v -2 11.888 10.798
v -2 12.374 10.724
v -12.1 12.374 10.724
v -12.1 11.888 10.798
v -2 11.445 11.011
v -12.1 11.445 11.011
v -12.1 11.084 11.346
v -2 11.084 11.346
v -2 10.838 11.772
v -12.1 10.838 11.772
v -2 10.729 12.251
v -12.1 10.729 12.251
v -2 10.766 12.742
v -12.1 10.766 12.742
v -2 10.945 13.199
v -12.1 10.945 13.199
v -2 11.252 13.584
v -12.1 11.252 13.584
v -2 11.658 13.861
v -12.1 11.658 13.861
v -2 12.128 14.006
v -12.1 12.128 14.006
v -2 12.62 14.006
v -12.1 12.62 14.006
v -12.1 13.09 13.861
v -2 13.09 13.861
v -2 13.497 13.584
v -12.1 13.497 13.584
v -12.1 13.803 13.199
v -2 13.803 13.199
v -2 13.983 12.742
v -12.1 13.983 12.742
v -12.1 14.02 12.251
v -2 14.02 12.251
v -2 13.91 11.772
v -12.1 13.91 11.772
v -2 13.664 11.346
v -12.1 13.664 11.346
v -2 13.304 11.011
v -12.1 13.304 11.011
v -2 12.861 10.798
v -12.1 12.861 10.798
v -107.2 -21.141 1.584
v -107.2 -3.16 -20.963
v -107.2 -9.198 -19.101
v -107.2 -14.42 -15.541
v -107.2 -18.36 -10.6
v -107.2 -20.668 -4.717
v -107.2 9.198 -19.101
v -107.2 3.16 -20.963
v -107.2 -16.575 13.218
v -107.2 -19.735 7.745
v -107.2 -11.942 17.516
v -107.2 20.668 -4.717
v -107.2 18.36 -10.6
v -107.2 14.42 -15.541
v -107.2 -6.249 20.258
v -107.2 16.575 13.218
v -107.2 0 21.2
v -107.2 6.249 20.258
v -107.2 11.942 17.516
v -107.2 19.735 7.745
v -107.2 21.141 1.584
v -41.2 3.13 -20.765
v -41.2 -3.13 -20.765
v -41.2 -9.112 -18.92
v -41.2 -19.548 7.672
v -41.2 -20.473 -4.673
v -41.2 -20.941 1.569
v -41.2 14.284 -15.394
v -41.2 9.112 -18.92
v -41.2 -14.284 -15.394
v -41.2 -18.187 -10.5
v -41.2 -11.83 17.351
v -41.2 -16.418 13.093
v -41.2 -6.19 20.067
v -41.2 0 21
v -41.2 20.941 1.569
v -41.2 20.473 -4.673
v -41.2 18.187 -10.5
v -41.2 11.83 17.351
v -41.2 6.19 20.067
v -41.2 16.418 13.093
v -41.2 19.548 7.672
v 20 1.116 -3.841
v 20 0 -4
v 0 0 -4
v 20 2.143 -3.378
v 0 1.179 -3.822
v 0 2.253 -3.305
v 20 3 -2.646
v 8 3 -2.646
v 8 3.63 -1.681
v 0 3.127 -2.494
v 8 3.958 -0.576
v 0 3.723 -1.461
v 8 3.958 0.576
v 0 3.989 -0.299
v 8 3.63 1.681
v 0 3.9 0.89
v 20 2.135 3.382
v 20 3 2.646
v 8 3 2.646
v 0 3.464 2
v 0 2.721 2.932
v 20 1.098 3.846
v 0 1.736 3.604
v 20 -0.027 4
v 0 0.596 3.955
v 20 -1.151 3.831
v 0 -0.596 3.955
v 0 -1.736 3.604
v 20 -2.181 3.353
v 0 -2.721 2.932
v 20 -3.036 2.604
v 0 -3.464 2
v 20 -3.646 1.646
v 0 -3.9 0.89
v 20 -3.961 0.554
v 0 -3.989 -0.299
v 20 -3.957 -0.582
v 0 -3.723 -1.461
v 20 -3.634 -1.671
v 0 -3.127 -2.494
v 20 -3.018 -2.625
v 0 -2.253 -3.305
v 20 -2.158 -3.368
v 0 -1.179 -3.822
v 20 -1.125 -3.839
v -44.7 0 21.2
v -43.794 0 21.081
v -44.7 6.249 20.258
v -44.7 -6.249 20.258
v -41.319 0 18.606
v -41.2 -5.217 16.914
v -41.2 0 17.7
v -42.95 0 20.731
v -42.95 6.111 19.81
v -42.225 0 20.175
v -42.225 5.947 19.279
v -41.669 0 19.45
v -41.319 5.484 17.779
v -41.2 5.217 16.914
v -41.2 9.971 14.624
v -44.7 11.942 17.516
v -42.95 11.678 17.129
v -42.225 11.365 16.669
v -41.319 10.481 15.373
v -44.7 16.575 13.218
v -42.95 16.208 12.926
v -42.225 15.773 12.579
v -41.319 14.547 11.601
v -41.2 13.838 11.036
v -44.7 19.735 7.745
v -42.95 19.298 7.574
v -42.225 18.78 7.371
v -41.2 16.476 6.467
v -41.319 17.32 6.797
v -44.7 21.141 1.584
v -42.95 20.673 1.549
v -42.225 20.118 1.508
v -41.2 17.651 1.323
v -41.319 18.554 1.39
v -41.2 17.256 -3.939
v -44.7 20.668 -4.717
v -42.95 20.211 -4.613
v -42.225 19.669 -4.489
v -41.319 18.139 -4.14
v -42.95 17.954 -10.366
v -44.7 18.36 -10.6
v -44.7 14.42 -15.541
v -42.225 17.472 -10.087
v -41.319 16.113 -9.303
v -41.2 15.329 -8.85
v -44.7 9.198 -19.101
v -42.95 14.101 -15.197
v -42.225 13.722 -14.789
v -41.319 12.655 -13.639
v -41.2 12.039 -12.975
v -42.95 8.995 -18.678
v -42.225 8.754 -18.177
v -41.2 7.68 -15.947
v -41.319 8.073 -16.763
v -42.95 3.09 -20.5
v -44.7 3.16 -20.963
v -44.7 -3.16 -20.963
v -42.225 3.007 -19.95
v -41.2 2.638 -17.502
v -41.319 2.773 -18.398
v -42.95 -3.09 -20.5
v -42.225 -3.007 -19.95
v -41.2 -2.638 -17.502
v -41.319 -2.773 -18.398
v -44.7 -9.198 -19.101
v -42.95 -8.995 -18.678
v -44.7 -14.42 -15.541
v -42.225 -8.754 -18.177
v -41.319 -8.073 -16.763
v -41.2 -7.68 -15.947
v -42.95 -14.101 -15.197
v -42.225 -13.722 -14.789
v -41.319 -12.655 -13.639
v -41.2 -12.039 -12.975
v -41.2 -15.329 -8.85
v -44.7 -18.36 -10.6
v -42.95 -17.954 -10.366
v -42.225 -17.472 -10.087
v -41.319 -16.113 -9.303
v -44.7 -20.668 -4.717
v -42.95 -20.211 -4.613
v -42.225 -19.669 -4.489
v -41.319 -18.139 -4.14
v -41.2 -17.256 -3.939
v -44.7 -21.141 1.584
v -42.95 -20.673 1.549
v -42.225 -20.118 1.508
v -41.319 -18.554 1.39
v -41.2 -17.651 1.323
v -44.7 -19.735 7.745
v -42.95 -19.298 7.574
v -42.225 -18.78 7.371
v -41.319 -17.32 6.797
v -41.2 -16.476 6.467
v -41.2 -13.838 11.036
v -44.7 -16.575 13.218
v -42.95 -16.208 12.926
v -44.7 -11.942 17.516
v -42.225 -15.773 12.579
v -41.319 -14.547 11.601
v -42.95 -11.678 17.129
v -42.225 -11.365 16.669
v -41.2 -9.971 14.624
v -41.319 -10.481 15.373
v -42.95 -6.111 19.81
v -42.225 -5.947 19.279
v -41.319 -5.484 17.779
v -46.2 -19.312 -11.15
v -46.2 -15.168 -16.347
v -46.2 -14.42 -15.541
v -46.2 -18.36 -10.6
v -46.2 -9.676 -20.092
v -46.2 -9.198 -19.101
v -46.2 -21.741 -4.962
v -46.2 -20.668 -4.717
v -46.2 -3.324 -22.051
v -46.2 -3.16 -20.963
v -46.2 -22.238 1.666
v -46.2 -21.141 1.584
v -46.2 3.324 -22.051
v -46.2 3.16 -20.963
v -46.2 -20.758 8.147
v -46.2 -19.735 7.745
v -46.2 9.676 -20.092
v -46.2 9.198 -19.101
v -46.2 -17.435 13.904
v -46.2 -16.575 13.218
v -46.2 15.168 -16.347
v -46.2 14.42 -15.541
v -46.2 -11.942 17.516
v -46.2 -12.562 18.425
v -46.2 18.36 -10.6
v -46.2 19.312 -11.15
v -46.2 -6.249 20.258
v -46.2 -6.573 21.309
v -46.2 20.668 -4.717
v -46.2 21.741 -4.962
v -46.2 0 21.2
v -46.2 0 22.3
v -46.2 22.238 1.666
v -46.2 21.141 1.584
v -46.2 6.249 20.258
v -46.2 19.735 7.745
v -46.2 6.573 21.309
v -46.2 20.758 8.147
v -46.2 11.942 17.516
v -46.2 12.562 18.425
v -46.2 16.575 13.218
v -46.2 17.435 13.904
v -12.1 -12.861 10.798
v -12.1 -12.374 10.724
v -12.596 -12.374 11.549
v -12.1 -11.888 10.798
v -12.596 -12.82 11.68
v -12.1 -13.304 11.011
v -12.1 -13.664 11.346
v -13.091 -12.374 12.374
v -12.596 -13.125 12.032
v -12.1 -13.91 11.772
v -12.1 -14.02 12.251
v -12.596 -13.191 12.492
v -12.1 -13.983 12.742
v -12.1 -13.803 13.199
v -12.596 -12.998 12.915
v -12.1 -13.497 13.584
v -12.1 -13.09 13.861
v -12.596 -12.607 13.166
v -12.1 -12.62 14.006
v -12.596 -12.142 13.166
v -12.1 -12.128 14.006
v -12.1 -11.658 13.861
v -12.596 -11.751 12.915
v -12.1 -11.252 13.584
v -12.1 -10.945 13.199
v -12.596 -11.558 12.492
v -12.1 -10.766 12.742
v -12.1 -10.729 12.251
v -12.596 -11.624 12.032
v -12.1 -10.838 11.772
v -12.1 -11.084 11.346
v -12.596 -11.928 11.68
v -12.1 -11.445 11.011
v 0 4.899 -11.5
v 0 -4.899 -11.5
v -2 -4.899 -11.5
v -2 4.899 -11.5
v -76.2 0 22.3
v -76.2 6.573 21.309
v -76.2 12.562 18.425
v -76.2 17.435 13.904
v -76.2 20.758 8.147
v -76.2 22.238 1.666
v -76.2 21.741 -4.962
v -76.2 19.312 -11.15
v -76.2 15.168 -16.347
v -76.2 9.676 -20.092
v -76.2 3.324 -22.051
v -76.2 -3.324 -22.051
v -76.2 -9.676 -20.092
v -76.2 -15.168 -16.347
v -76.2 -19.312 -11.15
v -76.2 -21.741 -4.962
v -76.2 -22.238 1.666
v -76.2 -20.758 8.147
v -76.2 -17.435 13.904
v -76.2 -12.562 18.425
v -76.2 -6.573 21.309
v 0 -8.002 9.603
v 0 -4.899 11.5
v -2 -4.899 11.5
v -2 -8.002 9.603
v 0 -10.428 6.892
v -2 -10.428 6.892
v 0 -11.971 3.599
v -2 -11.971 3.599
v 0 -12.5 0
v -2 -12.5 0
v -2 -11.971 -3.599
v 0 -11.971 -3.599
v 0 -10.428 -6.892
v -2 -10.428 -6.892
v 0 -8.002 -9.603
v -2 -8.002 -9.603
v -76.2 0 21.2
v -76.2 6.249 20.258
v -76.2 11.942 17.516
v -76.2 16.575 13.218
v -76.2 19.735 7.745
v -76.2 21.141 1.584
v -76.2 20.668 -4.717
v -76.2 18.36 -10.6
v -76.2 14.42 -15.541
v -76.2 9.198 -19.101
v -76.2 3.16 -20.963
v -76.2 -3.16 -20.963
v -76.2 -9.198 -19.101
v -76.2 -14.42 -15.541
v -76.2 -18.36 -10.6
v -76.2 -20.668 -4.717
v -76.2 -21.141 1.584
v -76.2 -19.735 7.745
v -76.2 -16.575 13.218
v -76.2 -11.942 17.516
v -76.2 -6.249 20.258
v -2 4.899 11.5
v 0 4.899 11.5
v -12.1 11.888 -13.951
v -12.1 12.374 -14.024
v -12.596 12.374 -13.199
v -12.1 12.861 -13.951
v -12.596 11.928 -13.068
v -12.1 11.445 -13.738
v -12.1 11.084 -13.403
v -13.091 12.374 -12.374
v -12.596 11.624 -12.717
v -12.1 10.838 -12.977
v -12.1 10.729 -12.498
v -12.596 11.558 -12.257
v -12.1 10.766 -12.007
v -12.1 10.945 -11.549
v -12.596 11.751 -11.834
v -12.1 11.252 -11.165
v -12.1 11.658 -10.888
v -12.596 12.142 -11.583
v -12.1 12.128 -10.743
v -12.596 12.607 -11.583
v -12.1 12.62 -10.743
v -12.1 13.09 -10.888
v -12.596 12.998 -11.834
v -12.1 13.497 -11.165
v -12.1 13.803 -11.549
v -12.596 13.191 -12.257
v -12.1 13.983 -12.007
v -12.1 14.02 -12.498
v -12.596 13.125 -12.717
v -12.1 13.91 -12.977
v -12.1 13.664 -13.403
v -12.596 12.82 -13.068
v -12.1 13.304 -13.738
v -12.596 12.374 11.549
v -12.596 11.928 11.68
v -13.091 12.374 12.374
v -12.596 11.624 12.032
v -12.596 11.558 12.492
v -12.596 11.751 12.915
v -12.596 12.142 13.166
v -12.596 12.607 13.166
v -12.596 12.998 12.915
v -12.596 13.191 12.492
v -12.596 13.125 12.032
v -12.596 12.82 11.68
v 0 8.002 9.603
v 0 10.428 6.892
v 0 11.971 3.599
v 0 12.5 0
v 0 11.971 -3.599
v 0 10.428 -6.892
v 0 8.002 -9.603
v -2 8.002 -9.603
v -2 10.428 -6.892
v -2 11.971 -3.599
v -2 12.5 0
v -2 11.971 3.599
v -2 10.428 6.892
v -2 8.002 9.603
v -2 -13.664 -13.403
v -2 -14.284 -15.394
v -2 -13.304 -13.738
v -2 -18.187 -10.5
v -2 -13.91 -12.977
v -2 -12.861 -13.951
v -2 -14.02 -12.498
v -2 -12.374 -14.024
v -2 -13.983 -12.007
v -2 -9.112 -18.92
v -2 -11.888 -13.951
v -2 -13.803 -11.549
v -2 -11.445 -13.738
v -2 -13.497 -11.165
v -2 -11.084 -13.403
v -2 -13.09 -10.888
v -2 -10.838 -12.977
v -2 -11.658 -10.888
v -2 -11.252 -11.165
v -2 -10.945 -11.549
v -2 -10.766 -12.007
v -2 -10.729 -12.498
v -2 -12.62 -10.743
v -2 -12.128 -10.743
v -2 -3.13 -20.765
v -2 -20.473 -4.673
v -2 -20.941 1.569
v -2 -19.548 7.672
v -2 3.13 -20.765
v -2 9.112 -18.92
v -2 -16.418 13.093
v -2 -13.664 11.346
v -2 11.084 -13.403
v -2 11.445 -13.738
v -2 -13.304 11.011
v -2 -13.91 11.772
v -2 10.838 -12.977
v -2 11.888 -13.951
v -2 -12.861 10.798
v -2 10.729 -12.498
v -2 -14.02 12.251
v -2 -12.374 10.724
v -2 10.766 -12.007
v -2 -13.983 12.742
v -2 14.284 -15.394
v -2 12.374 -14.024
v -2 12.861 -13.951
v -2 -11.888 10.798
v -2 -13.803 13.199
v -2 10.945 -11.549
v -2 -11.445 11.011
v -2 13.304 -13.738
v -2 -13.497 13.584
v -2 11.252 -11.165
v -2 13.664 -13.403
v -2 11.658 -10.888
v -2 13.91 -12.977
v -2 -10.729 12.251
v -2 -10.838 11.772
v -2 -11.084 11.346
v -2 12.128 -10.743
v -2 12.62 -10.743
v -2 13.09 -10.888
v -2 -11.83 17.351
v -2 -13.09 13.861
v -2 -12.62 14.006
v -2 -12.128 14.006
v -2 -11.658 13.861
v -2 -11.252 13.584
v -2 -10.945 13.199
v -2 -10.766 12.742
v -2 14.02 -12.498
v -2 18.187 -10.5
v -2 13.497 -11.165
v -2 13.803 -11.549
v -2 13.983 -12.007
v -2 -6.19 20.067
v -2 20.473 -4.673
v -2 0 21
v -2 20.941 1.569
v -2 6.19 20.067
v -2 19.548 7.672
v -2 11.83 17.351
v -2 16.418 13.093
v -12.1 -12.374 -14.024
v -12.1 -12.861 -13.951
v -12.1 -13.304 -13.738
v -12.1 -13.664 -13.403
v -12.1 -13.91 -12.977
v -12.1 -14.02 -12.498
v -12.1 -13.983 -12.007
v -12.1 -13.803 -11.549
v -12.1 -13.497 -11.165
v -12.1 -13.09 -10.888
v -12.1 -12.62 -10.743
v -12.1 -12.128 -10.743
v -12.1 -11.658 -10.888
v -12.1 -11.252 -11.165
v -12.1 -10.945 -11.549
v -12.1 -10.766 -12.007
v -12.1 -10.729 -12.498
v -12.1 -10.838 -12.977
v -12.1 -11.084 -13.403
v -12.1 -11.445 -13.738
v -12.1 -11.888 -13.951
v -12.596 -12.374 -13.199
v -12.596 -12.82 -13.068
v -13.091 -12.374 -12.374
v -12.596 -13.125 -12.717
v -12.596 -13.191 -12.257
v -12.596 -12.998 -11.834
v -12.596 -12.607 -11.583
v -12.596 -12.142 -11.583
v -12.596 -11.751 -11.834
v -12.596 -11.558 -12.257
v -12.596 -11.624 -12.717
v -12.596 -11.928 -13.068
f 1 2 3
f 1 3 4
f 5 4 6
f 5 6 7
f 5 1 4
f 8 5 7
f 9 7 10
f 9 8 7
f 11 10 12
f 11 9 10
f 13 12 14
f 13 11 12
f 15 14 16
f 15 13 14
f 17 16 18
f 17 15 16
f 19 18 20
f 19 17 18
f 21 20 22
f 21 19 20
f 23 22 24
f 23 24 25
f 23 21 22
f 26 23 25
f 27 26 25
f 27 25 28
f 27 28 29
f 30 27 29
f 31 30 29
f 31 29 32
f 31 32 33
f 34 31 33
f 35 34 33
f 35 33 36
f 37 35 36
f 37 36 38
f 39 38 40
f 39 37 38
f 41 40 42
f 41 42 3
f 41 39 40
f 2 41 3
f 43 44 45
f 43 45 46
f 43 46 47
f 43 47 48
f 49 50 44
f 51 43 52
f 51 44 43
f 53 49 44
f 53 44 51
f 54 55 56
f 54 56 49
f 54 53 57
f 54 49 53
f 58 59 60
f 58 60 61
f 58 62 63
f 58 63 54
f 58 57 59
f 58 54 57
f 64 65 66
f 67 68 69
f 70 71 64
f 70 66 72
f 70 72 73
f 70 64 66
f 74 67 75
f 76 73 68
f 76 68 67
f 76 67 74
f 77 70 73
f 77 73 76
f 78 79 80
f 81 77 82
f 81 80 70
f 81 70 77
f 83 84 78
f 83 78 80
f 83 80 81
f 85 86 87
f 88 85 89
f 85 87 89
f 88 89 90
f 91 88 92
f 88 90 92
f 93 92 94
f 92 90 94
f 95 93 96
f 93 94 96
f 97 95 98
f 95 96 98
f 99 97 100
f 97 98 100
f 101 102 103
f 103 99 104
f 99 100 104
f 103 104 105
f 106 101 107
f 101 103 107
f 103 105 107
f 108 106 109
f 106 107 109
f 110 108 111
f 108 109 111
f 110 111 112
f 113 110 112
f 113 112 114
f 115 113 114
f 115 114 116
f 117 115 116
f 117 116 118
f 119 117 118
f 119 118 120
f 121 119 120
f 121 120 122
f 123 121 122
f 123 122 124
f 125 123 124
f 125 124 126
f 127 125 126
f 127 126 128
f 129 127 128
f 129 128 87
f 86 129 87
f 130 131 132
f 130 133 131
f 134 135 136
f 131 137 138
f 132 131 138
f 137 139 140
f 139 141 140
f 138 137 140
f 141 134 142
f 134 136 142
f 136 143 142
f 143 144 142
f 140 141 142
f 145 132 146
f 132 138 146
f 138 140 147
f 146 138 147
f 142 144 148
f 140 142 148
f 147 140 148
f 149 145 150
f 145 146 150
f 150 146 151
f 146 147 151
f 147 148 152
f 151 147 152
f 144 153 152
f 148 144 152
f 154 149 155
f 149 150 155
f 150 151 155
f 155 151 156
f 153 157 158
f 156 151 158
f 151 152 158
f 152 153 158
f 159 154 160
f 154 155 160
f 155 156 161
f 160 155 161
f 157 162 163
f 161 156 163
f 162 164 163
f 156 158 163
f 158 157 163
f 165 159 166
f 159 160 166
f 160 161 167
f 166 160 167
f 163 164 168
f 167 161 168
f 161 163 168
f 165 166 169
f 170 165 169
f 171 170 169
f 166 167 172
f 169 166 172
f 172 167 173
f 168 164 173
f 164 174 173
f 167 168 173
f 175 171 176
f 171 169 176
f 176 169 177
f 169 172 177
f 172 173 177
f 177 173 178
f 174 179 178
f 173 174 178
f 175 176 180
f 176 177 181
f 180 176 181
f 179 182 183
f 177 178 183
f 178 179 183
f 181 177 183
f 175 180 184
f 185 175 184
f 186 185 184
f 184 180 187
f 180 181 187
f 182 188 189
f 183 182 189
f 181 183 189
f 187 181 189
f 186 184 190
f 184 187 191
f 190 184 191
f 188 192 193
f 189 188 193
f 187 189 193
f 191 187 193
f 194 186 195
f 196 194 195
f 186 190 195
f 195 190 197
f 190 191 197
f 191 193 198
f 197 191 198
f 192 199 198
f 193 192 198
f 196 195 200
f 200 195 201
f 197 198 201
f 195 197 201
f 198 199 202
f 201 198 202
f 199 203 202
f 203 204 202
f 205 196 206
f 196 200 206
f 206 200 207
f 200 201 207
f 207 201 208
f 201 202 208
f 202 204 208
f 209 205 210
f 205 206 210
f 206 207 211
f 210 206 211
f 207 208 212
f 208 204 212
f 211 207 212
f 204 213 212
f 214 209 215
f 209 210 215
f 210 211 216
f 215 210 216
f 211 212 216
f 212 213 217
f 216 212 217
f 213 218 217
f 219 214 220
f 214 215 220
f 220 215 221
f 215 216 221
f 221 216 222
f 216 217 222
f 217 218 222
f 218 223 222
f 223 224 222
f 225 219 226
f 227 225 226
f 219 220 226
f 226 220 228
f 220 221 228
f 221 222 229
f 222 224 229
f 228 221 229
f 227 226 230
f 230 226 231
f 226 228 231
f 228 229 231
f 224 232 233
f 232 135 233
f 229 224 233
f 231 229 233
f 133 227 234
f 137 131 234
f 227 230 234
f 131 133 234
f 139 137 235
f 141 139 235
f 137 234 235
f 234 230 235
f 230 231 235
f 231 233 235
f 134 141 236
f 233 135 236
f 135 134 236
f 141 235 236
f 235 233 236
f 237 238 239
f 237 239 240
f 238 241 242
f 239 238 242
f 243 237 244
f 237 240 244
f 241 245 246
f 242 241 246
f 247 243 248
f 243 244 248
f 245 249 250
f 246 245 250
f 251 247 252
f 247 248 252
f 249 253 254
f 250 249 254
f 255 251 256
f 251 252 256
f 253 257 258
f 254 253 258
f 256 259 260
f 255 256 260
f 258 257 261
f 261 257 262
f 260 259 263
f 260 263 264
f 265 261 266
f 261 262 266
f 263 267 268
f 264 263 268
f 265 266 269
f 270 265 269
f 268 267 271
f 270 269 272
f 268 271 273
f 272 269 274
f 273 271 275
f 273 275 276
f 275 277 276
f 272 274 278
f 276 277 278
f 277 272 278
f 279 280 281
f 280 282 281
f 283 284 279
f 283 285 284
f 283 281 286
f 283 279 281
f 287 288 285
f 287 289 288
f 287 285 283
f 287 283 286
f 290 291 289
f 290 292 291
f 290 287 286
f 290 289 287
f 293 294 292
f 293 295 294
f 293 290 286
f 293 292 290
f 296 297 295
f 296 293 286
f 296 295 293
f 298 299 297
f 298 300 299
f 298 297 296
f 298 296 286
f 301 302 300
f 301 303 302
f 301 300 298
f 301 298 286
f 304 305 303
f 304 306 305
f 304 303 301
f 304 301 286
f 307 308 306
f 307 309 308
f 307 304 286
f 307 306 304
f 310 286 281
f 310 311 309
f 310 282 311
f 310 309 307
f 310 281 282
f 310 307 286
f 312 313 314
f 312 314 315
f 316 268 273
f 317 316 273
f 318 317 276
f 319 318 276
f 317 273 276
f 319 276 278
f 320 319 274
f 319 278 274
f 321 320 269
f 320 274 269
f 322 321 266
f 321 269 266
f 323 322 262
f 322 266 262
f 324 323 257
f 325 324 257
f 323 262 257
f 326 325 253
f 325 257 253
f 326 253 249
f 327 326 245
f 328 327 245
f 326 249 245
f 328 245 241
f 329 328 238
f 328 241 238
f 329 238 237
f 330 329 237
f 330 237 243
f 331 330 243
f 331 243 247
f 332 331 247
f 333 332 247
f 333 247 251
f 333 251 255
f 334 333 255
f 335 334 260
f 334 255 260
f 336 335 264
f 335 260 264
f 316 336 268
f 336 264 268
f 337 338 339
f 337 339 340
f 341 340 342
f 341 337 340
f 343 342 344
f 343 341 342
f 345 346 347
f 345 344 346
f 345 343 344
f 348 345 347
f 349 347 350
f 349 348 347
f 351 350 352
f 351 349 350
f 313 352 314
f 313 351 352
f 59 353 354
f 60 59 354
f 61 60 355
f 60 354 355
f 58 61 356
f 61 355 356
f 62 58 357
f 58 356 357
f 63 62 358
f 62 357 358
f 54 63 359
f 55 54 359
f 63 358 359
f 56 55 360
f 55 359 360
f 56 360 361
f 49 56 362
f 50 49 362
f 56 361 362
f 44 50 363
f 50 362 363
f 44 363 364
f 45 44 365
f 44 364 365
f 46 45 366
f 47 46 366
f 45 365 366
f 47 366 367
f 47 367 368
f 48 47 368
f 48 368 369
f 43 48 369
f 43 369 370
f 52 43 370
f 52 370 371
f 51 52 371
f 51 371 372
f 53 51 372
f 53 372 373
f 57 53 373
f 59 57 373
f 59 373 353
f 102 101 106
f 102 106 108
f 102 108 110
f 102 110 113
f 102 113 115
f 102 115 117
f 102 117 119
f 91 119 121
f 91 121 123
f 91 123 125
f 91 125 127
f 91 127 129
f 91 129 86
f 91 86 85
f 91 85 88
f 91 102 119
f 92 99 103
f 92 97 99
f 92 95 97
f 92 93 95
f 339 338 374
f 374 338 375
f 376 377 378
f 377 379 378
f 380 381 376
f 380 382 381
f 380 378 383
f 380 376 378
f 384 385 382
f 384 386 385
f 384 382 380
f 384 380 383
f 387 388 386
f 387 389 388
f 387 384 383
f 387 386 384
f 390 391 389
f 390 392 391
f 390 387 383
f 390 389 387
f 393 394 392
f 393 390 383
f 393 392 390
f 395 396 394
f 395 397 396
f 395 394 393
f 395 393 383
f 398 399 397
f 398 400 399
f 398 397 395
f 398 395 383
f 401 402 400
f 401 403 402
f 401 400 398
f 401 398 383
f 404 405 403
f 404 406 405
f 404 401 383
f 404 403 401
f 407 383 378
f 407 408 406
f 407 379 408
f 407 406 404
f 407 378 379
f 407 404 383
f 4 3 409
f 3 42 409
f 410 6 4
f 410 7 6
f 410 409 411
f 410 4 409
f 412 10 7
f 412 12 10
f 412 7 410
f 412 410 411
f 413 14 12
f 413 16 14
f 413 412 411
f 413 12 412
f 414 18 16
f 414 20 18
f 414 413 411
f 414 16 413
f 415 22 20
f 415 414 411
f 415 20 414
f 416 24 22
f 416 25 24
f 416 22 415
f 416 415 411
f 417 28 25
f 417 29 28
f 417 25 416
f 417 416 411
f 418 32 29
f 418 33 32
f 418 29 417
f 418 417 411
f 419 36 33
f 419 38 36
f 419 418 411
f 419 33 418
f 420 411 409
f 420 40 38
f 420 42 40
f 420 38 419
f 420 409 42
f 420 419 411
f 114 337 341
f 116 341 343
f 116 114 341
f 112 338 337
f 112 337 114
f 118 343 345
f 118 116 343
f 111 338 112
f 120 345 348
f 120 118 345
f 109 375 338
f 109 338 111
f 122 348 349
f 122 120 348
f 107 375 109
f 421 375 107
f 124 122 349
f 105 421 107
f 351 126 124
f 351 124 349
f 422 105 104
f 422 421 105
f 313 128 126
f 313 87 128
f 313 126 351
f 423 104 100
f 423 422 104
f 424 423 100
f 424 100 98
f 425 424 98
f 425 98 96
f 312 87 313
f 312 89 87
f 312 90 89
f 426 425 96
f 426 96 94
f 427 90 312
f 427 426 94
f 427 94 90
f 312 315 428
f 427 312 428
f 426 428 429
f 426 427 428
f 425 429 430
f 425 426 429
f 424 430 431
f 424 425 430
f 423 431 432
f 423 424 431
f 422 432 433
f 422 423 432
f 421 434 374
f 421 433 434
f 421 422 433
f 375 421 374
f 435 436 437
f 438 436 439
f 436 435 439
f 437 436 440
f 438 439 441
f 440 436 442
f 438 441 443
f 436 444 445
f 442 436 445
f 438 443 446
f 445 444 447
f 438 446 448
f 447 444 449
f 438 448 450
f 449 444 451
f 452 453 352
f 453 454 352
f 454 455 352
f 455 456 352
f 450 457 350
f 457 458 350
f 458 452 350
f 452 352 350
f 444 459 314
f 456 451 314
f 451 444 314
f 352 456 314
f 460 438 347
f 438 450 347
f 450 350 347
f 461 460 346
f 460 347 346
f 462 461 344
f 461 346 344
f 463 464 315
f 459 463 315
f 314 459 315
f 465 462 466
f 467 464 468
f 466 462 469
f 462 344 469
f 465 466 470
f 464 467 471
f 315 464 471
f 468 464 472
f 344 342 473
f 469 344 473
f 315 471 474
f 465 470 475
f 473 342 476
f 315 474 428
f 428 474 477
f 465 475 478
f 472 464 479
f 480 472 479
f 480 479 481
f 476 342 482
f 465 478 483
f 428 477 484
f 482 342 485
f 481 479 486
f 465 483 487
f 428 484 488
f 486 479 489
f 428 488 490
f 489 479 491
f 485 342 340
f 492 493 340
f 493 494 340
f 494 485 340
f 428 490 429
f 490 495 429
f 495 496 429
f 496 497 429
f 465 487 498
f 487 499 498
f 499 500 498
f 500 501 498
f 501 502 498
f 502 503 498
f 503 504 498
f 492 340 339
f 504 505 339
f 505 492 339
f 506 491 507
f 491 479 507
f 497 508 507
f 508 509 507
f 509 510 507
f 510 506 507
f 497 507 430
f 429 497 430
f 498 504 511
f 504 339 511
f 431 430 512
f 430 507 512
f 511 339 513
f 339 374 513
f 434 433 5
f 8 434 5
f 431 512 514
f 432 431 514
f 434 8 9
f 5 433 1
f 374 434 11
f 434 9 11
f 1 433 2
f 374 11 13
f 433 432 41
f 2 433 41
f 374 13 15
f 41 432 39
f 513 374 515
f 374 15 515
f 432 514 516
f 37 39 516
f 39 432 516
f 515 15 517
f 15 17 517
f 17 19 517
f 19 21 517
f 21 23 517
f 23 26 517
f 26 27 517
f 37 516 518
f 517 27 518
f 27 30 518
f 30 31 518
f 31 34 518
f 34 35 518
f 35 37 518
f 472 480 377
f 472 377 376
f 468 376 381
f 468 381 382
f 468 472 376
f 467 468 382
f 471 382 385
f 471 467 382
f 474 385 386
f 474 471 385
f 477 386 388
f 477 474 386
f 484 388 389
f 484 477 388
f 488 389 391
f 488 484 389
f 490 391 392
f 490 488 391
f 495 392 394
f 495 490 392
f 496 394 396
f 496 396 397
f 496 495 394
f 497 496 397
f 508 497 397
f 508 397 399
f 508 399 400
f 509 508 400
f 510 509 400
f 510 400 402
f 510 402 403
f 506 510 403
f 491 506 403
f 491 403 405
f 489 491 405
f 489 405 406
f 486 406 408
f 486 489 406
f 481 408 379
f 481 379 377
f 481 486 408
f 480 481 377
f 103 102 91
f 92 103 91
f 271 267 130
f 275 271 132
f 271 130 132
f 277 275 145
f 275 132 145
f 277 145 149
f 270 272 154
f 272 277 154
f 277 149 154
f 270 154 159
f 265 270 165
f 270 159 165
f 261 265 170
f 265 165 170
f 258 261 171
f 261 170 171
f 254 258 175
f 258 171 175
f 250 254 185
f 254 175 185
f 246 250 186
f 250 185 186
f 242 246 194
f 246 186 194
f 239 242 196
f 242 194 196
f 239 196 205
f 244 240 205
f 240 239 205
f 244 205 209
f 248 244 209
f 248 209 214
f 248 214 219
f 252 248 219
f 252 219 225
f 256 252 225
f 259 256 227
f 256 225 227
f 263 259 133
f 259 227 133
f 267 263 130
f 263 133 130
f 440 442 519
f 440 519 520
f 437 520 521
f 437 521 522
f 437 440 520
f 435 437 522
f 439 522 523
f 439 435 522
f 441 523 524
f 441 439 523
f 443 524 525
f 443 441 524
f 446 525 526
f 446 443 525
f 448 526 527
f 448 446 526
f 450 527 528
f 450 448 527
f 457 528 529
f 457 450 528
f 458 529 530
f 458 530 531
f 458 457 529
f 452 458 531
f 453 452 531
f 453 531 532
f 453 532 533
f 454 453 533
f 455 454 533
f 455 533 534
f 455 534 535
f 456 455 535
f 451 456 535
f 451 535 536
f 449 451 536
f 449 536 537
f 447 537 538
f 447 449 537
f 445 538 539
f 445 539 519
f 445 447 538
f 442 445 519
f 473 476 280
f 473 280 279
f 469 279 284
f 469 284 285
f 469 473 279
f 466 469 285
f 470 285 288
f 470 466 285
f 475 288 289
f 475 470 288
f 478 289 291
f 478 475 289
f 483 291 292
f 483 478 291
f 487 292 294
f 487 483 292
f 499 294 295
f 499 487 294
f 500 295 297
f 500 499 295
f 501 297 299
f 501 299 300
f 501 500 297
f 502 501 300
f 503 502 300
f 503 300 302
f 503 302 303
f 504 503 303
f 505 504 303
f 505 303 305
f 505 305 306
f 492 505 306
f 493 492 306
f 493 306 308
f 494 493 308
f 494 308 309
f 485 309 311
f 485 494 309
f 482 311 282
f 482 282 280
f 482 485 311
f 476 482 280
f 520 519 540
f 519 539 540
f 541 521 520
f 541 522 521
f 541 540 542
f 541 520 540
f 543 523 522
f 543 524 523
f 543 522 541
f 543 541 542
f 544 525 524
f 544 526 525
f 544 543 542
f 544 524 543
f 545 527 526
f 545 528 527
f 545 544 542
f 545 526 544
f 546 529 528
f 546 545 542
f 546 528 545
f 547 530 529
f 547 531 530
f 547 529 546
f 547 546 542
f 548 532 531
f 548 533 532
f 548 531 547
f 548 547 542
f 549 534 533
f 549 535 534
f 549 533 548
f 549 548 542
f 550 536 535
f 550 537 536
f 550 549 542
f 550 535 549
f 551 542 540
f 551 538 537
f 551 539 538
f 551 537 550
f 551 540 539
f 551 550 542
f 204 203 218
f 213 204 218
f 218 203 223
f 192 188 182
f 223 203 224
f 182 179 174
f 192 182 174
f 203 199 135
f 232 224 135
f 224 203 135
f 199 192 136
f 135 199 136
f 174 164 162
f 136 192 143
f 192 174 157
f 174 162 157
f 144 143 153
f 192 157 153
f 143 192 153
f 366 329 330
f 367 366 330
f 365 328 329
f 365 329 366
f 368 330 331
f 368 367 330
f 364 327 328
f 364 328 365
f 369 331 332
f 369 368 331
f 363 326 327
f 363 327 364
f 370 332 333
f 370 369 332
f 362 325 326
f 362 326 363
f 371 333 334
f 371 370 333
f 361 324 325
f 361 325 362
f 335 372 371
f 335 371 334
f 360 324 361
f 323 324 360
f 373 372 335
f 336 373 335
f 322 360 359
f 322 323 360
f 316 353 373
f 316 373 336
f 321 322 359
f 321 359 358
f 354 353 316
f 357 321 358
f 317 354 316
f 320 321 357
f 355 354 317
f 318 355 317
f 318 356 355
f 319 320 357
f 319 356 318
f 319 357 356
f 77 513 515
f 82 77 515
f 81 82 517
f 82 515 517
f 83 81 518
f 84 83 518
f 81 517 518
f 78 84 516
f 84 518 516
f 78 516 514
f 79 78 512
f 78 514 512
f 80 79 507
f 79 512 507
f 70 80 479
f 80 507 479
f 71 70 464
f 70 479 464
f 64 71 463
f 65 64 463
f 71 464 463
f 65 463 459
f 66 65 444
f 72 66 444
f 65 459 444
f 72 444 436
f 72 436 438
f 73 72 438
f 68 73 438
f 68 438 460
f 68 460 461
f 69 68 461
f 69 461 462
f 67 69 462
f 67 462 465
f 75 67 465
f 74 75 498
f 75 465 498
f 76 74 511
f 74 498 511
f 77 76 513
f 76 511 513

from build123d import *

# Parameters (mm, degrees)
SKETCH1_R                = 12.5
BOSS_EXTRUDE1_DEPTH      = 2
SKETCH3_R                = 21
BOSS_EXTRUDE2_DEPTH      = 39.2
SKETCH5_R                = 21.2
BOSS_EXTRUDE3_DEPTH      = 66
FILLET1_R                = 3.5
BOSS_EXTRUDE4_START      = 5
SKETCH4_R                = 22.3
BOSS_EXTRUDE4_DEPTH      = 30
SKETCH6_R                = 4
BOSS_EXTRUDE5_DEPTH      = 20
SKETCH7_W                = 5.291502622
SKETCH7_H                = 2
CUT_EXTRUDE1_DEPTH       = 12
M4X0_7_M4X6DP_AT_2_COUNT = 2
M4X0_7_M4X6DP_AT_2_PITCH = 24.748737342
M4X0_7_M4X6DP_AT_3_COUNT = 2
M4X0_7_M4X6DP_AT_3_PITCH = 35
M4X0_7_M4X6DP_AT_4_COUNT = 2
M4X0_7_M4X6DP_AT_4_PITCH = 24.748737342
SKETCH11_OUTSIDE_W       = 74.996
SKETCH11_OUTSIDE_H       = 74.996
SKETCH11_OUTSIDE_W_2     = 23
SKETCH11_OUTSIDE_H_2     = 25
CUT_EXTRUDE2_DEPTH       = 2


with BuildPart() as part:
    # Sketch1 → Boss-Extrude1 (new body)
    with BuildSketch(Plane(origin=(0, 0, 0), x_dir=(0, 0, -1), z_dir=(1, 0, 0))):
        Circle(SKETCH1_R)
    extrude(amount=-BOSS_EXTRUDE1_DEPTH)

    # Sketch3 → Boss-Extrude2 (add)
    with BuildSketch(Plane.ZY.offset(2)):
        Circle(SKETCH3_R)
    extrude(amount=BOSS_EXTRUDE2_DEPTH)

    # Sketch6 → Boss-Extrude5 (add)
    with BuildSketch(Plane(origin=(0, 0, 0), x_dir=(0, 0, -1), z_dir=(1, 0, 0))):
        Circle(SKETCH6_R)
    extrude(amount=BOSS_EXTRUDE5_DEPTH)

    # Sketch7 → Cut-Extrude1 (cut)
    with BuildSketch(Plane(origin=(20, 0, 0), x_dir=(0, 0, -1), z_dir=(1, 0, 0))):
        with Locations((0, 4)):
            Rectangle(SKETCH7_W, SKETCH7_H)
    extrude(amount=-CUT_EXTRUDE1_DEPTH, mode=Mode.SUBTRACT)

    # Sketch10 → M4x0.7 "M4x6DP" (revolve, cut)
    with BuildSketch(Plane(origin=(-2, 12.374368671, 12.374368671), x_dir=(0, 0, -1), z_dir=(0, 1, 0))):
        Polygon((0, 0), (0, 11.091420021), (1.65, 10.1), (1.65, 0), align=None)
    m4x0_7_m4x6dp = revolve(axis=Axis((4.35, 12.374368671, 12.374368671), (-1, 0, 0)), mode=Mode.SUBTRACT)

    # M4x0.7 "M4x6DP" at 2: M4x0.7 "M4x6DP" ×2
    with Locations(*[(0, 0, -i * M4X0_7_M4X6DP_AT_2_PITCH) for i in range(1, M4X0_7_M4X6DP_AT_2_COUNT)]):
        add(m4x0_7_m4x6dp, mode=Mode.SUBTRACT)

    # M4x0.7 "M4x6DP" at 3: M4x0.7 "M4x6DP" ×2
    with Locations(*[Vector(0, -0.7071067811865476, -0.7071067811865476) * (i * M4X0_7_M4X6DP_AT_3_PITCH) for i in range(1, M4X0_7_M4X6DP_AT_3_COUNT)]):
        add(m4x0_7_m4x6dp, mode=Mode.SUBTRACT)

    # M4x0.7 "M4x6DP" at 4: M4x0.7 "M4x6DP" ×2
    with Locations(*[(0, -i * M4X0_7_M4X6DP_AT_4_PITCH, 0) for i in range(1, M4X0_7_M4X6DP_AT_4_COUNT)]):
        add(m4x0_7_m4x6dp, mode=Mode.SUBTRACT)

    # Sketch11 outside → Cut-Extrude2 (cut)
    with BuildSketch(Plane(origin=(0, 0, 0), x_dir=(0, 0, -1), z_dir=(1, 0, 0))):
        Rectangle(SKETCH11_OUTSIDE_W, SKETCH11_OUTSIDE_H)
        Rectangle(SKETCH11_OUTSIDE_W_2, SKETCH11_OUTSIDE_H_2, mode=Mode.SUBTRACT)
    extrude(amount=-CUT_EXTRUDE2_DEPTH, mode=Mode.SUBTRACT)


with BuildPart() as body_2:
    # Sketch5 → Boss-Extrude3 (new body)
    with BuildSketch(Plane.ZY.offset(41.2)):
        Circle(SKETCH5_R)
    extrude(amount=BOSS_EXTRUDE3_DEPTH)

    # Fillet1
    fillet1_edges = [body_2.edges().sort_by_distance(p)[0] for p in [
        (-41.2, 0, -21.2),
    ]]
    fillet(fillet1_edges, radius=FILLET1_R)

    # Sketch4 → Boss-Extrude4 (add)
    with BuildSketch(Plane.ZY.offset(41.2).offset(BOSS_EXTRUDE4_START)):
        Circle(SKETCH4_R)
    extrude(amount=BOSS_EXTRUDE4_DEPTH)


solid = Compound([part.part, body_2.part])
